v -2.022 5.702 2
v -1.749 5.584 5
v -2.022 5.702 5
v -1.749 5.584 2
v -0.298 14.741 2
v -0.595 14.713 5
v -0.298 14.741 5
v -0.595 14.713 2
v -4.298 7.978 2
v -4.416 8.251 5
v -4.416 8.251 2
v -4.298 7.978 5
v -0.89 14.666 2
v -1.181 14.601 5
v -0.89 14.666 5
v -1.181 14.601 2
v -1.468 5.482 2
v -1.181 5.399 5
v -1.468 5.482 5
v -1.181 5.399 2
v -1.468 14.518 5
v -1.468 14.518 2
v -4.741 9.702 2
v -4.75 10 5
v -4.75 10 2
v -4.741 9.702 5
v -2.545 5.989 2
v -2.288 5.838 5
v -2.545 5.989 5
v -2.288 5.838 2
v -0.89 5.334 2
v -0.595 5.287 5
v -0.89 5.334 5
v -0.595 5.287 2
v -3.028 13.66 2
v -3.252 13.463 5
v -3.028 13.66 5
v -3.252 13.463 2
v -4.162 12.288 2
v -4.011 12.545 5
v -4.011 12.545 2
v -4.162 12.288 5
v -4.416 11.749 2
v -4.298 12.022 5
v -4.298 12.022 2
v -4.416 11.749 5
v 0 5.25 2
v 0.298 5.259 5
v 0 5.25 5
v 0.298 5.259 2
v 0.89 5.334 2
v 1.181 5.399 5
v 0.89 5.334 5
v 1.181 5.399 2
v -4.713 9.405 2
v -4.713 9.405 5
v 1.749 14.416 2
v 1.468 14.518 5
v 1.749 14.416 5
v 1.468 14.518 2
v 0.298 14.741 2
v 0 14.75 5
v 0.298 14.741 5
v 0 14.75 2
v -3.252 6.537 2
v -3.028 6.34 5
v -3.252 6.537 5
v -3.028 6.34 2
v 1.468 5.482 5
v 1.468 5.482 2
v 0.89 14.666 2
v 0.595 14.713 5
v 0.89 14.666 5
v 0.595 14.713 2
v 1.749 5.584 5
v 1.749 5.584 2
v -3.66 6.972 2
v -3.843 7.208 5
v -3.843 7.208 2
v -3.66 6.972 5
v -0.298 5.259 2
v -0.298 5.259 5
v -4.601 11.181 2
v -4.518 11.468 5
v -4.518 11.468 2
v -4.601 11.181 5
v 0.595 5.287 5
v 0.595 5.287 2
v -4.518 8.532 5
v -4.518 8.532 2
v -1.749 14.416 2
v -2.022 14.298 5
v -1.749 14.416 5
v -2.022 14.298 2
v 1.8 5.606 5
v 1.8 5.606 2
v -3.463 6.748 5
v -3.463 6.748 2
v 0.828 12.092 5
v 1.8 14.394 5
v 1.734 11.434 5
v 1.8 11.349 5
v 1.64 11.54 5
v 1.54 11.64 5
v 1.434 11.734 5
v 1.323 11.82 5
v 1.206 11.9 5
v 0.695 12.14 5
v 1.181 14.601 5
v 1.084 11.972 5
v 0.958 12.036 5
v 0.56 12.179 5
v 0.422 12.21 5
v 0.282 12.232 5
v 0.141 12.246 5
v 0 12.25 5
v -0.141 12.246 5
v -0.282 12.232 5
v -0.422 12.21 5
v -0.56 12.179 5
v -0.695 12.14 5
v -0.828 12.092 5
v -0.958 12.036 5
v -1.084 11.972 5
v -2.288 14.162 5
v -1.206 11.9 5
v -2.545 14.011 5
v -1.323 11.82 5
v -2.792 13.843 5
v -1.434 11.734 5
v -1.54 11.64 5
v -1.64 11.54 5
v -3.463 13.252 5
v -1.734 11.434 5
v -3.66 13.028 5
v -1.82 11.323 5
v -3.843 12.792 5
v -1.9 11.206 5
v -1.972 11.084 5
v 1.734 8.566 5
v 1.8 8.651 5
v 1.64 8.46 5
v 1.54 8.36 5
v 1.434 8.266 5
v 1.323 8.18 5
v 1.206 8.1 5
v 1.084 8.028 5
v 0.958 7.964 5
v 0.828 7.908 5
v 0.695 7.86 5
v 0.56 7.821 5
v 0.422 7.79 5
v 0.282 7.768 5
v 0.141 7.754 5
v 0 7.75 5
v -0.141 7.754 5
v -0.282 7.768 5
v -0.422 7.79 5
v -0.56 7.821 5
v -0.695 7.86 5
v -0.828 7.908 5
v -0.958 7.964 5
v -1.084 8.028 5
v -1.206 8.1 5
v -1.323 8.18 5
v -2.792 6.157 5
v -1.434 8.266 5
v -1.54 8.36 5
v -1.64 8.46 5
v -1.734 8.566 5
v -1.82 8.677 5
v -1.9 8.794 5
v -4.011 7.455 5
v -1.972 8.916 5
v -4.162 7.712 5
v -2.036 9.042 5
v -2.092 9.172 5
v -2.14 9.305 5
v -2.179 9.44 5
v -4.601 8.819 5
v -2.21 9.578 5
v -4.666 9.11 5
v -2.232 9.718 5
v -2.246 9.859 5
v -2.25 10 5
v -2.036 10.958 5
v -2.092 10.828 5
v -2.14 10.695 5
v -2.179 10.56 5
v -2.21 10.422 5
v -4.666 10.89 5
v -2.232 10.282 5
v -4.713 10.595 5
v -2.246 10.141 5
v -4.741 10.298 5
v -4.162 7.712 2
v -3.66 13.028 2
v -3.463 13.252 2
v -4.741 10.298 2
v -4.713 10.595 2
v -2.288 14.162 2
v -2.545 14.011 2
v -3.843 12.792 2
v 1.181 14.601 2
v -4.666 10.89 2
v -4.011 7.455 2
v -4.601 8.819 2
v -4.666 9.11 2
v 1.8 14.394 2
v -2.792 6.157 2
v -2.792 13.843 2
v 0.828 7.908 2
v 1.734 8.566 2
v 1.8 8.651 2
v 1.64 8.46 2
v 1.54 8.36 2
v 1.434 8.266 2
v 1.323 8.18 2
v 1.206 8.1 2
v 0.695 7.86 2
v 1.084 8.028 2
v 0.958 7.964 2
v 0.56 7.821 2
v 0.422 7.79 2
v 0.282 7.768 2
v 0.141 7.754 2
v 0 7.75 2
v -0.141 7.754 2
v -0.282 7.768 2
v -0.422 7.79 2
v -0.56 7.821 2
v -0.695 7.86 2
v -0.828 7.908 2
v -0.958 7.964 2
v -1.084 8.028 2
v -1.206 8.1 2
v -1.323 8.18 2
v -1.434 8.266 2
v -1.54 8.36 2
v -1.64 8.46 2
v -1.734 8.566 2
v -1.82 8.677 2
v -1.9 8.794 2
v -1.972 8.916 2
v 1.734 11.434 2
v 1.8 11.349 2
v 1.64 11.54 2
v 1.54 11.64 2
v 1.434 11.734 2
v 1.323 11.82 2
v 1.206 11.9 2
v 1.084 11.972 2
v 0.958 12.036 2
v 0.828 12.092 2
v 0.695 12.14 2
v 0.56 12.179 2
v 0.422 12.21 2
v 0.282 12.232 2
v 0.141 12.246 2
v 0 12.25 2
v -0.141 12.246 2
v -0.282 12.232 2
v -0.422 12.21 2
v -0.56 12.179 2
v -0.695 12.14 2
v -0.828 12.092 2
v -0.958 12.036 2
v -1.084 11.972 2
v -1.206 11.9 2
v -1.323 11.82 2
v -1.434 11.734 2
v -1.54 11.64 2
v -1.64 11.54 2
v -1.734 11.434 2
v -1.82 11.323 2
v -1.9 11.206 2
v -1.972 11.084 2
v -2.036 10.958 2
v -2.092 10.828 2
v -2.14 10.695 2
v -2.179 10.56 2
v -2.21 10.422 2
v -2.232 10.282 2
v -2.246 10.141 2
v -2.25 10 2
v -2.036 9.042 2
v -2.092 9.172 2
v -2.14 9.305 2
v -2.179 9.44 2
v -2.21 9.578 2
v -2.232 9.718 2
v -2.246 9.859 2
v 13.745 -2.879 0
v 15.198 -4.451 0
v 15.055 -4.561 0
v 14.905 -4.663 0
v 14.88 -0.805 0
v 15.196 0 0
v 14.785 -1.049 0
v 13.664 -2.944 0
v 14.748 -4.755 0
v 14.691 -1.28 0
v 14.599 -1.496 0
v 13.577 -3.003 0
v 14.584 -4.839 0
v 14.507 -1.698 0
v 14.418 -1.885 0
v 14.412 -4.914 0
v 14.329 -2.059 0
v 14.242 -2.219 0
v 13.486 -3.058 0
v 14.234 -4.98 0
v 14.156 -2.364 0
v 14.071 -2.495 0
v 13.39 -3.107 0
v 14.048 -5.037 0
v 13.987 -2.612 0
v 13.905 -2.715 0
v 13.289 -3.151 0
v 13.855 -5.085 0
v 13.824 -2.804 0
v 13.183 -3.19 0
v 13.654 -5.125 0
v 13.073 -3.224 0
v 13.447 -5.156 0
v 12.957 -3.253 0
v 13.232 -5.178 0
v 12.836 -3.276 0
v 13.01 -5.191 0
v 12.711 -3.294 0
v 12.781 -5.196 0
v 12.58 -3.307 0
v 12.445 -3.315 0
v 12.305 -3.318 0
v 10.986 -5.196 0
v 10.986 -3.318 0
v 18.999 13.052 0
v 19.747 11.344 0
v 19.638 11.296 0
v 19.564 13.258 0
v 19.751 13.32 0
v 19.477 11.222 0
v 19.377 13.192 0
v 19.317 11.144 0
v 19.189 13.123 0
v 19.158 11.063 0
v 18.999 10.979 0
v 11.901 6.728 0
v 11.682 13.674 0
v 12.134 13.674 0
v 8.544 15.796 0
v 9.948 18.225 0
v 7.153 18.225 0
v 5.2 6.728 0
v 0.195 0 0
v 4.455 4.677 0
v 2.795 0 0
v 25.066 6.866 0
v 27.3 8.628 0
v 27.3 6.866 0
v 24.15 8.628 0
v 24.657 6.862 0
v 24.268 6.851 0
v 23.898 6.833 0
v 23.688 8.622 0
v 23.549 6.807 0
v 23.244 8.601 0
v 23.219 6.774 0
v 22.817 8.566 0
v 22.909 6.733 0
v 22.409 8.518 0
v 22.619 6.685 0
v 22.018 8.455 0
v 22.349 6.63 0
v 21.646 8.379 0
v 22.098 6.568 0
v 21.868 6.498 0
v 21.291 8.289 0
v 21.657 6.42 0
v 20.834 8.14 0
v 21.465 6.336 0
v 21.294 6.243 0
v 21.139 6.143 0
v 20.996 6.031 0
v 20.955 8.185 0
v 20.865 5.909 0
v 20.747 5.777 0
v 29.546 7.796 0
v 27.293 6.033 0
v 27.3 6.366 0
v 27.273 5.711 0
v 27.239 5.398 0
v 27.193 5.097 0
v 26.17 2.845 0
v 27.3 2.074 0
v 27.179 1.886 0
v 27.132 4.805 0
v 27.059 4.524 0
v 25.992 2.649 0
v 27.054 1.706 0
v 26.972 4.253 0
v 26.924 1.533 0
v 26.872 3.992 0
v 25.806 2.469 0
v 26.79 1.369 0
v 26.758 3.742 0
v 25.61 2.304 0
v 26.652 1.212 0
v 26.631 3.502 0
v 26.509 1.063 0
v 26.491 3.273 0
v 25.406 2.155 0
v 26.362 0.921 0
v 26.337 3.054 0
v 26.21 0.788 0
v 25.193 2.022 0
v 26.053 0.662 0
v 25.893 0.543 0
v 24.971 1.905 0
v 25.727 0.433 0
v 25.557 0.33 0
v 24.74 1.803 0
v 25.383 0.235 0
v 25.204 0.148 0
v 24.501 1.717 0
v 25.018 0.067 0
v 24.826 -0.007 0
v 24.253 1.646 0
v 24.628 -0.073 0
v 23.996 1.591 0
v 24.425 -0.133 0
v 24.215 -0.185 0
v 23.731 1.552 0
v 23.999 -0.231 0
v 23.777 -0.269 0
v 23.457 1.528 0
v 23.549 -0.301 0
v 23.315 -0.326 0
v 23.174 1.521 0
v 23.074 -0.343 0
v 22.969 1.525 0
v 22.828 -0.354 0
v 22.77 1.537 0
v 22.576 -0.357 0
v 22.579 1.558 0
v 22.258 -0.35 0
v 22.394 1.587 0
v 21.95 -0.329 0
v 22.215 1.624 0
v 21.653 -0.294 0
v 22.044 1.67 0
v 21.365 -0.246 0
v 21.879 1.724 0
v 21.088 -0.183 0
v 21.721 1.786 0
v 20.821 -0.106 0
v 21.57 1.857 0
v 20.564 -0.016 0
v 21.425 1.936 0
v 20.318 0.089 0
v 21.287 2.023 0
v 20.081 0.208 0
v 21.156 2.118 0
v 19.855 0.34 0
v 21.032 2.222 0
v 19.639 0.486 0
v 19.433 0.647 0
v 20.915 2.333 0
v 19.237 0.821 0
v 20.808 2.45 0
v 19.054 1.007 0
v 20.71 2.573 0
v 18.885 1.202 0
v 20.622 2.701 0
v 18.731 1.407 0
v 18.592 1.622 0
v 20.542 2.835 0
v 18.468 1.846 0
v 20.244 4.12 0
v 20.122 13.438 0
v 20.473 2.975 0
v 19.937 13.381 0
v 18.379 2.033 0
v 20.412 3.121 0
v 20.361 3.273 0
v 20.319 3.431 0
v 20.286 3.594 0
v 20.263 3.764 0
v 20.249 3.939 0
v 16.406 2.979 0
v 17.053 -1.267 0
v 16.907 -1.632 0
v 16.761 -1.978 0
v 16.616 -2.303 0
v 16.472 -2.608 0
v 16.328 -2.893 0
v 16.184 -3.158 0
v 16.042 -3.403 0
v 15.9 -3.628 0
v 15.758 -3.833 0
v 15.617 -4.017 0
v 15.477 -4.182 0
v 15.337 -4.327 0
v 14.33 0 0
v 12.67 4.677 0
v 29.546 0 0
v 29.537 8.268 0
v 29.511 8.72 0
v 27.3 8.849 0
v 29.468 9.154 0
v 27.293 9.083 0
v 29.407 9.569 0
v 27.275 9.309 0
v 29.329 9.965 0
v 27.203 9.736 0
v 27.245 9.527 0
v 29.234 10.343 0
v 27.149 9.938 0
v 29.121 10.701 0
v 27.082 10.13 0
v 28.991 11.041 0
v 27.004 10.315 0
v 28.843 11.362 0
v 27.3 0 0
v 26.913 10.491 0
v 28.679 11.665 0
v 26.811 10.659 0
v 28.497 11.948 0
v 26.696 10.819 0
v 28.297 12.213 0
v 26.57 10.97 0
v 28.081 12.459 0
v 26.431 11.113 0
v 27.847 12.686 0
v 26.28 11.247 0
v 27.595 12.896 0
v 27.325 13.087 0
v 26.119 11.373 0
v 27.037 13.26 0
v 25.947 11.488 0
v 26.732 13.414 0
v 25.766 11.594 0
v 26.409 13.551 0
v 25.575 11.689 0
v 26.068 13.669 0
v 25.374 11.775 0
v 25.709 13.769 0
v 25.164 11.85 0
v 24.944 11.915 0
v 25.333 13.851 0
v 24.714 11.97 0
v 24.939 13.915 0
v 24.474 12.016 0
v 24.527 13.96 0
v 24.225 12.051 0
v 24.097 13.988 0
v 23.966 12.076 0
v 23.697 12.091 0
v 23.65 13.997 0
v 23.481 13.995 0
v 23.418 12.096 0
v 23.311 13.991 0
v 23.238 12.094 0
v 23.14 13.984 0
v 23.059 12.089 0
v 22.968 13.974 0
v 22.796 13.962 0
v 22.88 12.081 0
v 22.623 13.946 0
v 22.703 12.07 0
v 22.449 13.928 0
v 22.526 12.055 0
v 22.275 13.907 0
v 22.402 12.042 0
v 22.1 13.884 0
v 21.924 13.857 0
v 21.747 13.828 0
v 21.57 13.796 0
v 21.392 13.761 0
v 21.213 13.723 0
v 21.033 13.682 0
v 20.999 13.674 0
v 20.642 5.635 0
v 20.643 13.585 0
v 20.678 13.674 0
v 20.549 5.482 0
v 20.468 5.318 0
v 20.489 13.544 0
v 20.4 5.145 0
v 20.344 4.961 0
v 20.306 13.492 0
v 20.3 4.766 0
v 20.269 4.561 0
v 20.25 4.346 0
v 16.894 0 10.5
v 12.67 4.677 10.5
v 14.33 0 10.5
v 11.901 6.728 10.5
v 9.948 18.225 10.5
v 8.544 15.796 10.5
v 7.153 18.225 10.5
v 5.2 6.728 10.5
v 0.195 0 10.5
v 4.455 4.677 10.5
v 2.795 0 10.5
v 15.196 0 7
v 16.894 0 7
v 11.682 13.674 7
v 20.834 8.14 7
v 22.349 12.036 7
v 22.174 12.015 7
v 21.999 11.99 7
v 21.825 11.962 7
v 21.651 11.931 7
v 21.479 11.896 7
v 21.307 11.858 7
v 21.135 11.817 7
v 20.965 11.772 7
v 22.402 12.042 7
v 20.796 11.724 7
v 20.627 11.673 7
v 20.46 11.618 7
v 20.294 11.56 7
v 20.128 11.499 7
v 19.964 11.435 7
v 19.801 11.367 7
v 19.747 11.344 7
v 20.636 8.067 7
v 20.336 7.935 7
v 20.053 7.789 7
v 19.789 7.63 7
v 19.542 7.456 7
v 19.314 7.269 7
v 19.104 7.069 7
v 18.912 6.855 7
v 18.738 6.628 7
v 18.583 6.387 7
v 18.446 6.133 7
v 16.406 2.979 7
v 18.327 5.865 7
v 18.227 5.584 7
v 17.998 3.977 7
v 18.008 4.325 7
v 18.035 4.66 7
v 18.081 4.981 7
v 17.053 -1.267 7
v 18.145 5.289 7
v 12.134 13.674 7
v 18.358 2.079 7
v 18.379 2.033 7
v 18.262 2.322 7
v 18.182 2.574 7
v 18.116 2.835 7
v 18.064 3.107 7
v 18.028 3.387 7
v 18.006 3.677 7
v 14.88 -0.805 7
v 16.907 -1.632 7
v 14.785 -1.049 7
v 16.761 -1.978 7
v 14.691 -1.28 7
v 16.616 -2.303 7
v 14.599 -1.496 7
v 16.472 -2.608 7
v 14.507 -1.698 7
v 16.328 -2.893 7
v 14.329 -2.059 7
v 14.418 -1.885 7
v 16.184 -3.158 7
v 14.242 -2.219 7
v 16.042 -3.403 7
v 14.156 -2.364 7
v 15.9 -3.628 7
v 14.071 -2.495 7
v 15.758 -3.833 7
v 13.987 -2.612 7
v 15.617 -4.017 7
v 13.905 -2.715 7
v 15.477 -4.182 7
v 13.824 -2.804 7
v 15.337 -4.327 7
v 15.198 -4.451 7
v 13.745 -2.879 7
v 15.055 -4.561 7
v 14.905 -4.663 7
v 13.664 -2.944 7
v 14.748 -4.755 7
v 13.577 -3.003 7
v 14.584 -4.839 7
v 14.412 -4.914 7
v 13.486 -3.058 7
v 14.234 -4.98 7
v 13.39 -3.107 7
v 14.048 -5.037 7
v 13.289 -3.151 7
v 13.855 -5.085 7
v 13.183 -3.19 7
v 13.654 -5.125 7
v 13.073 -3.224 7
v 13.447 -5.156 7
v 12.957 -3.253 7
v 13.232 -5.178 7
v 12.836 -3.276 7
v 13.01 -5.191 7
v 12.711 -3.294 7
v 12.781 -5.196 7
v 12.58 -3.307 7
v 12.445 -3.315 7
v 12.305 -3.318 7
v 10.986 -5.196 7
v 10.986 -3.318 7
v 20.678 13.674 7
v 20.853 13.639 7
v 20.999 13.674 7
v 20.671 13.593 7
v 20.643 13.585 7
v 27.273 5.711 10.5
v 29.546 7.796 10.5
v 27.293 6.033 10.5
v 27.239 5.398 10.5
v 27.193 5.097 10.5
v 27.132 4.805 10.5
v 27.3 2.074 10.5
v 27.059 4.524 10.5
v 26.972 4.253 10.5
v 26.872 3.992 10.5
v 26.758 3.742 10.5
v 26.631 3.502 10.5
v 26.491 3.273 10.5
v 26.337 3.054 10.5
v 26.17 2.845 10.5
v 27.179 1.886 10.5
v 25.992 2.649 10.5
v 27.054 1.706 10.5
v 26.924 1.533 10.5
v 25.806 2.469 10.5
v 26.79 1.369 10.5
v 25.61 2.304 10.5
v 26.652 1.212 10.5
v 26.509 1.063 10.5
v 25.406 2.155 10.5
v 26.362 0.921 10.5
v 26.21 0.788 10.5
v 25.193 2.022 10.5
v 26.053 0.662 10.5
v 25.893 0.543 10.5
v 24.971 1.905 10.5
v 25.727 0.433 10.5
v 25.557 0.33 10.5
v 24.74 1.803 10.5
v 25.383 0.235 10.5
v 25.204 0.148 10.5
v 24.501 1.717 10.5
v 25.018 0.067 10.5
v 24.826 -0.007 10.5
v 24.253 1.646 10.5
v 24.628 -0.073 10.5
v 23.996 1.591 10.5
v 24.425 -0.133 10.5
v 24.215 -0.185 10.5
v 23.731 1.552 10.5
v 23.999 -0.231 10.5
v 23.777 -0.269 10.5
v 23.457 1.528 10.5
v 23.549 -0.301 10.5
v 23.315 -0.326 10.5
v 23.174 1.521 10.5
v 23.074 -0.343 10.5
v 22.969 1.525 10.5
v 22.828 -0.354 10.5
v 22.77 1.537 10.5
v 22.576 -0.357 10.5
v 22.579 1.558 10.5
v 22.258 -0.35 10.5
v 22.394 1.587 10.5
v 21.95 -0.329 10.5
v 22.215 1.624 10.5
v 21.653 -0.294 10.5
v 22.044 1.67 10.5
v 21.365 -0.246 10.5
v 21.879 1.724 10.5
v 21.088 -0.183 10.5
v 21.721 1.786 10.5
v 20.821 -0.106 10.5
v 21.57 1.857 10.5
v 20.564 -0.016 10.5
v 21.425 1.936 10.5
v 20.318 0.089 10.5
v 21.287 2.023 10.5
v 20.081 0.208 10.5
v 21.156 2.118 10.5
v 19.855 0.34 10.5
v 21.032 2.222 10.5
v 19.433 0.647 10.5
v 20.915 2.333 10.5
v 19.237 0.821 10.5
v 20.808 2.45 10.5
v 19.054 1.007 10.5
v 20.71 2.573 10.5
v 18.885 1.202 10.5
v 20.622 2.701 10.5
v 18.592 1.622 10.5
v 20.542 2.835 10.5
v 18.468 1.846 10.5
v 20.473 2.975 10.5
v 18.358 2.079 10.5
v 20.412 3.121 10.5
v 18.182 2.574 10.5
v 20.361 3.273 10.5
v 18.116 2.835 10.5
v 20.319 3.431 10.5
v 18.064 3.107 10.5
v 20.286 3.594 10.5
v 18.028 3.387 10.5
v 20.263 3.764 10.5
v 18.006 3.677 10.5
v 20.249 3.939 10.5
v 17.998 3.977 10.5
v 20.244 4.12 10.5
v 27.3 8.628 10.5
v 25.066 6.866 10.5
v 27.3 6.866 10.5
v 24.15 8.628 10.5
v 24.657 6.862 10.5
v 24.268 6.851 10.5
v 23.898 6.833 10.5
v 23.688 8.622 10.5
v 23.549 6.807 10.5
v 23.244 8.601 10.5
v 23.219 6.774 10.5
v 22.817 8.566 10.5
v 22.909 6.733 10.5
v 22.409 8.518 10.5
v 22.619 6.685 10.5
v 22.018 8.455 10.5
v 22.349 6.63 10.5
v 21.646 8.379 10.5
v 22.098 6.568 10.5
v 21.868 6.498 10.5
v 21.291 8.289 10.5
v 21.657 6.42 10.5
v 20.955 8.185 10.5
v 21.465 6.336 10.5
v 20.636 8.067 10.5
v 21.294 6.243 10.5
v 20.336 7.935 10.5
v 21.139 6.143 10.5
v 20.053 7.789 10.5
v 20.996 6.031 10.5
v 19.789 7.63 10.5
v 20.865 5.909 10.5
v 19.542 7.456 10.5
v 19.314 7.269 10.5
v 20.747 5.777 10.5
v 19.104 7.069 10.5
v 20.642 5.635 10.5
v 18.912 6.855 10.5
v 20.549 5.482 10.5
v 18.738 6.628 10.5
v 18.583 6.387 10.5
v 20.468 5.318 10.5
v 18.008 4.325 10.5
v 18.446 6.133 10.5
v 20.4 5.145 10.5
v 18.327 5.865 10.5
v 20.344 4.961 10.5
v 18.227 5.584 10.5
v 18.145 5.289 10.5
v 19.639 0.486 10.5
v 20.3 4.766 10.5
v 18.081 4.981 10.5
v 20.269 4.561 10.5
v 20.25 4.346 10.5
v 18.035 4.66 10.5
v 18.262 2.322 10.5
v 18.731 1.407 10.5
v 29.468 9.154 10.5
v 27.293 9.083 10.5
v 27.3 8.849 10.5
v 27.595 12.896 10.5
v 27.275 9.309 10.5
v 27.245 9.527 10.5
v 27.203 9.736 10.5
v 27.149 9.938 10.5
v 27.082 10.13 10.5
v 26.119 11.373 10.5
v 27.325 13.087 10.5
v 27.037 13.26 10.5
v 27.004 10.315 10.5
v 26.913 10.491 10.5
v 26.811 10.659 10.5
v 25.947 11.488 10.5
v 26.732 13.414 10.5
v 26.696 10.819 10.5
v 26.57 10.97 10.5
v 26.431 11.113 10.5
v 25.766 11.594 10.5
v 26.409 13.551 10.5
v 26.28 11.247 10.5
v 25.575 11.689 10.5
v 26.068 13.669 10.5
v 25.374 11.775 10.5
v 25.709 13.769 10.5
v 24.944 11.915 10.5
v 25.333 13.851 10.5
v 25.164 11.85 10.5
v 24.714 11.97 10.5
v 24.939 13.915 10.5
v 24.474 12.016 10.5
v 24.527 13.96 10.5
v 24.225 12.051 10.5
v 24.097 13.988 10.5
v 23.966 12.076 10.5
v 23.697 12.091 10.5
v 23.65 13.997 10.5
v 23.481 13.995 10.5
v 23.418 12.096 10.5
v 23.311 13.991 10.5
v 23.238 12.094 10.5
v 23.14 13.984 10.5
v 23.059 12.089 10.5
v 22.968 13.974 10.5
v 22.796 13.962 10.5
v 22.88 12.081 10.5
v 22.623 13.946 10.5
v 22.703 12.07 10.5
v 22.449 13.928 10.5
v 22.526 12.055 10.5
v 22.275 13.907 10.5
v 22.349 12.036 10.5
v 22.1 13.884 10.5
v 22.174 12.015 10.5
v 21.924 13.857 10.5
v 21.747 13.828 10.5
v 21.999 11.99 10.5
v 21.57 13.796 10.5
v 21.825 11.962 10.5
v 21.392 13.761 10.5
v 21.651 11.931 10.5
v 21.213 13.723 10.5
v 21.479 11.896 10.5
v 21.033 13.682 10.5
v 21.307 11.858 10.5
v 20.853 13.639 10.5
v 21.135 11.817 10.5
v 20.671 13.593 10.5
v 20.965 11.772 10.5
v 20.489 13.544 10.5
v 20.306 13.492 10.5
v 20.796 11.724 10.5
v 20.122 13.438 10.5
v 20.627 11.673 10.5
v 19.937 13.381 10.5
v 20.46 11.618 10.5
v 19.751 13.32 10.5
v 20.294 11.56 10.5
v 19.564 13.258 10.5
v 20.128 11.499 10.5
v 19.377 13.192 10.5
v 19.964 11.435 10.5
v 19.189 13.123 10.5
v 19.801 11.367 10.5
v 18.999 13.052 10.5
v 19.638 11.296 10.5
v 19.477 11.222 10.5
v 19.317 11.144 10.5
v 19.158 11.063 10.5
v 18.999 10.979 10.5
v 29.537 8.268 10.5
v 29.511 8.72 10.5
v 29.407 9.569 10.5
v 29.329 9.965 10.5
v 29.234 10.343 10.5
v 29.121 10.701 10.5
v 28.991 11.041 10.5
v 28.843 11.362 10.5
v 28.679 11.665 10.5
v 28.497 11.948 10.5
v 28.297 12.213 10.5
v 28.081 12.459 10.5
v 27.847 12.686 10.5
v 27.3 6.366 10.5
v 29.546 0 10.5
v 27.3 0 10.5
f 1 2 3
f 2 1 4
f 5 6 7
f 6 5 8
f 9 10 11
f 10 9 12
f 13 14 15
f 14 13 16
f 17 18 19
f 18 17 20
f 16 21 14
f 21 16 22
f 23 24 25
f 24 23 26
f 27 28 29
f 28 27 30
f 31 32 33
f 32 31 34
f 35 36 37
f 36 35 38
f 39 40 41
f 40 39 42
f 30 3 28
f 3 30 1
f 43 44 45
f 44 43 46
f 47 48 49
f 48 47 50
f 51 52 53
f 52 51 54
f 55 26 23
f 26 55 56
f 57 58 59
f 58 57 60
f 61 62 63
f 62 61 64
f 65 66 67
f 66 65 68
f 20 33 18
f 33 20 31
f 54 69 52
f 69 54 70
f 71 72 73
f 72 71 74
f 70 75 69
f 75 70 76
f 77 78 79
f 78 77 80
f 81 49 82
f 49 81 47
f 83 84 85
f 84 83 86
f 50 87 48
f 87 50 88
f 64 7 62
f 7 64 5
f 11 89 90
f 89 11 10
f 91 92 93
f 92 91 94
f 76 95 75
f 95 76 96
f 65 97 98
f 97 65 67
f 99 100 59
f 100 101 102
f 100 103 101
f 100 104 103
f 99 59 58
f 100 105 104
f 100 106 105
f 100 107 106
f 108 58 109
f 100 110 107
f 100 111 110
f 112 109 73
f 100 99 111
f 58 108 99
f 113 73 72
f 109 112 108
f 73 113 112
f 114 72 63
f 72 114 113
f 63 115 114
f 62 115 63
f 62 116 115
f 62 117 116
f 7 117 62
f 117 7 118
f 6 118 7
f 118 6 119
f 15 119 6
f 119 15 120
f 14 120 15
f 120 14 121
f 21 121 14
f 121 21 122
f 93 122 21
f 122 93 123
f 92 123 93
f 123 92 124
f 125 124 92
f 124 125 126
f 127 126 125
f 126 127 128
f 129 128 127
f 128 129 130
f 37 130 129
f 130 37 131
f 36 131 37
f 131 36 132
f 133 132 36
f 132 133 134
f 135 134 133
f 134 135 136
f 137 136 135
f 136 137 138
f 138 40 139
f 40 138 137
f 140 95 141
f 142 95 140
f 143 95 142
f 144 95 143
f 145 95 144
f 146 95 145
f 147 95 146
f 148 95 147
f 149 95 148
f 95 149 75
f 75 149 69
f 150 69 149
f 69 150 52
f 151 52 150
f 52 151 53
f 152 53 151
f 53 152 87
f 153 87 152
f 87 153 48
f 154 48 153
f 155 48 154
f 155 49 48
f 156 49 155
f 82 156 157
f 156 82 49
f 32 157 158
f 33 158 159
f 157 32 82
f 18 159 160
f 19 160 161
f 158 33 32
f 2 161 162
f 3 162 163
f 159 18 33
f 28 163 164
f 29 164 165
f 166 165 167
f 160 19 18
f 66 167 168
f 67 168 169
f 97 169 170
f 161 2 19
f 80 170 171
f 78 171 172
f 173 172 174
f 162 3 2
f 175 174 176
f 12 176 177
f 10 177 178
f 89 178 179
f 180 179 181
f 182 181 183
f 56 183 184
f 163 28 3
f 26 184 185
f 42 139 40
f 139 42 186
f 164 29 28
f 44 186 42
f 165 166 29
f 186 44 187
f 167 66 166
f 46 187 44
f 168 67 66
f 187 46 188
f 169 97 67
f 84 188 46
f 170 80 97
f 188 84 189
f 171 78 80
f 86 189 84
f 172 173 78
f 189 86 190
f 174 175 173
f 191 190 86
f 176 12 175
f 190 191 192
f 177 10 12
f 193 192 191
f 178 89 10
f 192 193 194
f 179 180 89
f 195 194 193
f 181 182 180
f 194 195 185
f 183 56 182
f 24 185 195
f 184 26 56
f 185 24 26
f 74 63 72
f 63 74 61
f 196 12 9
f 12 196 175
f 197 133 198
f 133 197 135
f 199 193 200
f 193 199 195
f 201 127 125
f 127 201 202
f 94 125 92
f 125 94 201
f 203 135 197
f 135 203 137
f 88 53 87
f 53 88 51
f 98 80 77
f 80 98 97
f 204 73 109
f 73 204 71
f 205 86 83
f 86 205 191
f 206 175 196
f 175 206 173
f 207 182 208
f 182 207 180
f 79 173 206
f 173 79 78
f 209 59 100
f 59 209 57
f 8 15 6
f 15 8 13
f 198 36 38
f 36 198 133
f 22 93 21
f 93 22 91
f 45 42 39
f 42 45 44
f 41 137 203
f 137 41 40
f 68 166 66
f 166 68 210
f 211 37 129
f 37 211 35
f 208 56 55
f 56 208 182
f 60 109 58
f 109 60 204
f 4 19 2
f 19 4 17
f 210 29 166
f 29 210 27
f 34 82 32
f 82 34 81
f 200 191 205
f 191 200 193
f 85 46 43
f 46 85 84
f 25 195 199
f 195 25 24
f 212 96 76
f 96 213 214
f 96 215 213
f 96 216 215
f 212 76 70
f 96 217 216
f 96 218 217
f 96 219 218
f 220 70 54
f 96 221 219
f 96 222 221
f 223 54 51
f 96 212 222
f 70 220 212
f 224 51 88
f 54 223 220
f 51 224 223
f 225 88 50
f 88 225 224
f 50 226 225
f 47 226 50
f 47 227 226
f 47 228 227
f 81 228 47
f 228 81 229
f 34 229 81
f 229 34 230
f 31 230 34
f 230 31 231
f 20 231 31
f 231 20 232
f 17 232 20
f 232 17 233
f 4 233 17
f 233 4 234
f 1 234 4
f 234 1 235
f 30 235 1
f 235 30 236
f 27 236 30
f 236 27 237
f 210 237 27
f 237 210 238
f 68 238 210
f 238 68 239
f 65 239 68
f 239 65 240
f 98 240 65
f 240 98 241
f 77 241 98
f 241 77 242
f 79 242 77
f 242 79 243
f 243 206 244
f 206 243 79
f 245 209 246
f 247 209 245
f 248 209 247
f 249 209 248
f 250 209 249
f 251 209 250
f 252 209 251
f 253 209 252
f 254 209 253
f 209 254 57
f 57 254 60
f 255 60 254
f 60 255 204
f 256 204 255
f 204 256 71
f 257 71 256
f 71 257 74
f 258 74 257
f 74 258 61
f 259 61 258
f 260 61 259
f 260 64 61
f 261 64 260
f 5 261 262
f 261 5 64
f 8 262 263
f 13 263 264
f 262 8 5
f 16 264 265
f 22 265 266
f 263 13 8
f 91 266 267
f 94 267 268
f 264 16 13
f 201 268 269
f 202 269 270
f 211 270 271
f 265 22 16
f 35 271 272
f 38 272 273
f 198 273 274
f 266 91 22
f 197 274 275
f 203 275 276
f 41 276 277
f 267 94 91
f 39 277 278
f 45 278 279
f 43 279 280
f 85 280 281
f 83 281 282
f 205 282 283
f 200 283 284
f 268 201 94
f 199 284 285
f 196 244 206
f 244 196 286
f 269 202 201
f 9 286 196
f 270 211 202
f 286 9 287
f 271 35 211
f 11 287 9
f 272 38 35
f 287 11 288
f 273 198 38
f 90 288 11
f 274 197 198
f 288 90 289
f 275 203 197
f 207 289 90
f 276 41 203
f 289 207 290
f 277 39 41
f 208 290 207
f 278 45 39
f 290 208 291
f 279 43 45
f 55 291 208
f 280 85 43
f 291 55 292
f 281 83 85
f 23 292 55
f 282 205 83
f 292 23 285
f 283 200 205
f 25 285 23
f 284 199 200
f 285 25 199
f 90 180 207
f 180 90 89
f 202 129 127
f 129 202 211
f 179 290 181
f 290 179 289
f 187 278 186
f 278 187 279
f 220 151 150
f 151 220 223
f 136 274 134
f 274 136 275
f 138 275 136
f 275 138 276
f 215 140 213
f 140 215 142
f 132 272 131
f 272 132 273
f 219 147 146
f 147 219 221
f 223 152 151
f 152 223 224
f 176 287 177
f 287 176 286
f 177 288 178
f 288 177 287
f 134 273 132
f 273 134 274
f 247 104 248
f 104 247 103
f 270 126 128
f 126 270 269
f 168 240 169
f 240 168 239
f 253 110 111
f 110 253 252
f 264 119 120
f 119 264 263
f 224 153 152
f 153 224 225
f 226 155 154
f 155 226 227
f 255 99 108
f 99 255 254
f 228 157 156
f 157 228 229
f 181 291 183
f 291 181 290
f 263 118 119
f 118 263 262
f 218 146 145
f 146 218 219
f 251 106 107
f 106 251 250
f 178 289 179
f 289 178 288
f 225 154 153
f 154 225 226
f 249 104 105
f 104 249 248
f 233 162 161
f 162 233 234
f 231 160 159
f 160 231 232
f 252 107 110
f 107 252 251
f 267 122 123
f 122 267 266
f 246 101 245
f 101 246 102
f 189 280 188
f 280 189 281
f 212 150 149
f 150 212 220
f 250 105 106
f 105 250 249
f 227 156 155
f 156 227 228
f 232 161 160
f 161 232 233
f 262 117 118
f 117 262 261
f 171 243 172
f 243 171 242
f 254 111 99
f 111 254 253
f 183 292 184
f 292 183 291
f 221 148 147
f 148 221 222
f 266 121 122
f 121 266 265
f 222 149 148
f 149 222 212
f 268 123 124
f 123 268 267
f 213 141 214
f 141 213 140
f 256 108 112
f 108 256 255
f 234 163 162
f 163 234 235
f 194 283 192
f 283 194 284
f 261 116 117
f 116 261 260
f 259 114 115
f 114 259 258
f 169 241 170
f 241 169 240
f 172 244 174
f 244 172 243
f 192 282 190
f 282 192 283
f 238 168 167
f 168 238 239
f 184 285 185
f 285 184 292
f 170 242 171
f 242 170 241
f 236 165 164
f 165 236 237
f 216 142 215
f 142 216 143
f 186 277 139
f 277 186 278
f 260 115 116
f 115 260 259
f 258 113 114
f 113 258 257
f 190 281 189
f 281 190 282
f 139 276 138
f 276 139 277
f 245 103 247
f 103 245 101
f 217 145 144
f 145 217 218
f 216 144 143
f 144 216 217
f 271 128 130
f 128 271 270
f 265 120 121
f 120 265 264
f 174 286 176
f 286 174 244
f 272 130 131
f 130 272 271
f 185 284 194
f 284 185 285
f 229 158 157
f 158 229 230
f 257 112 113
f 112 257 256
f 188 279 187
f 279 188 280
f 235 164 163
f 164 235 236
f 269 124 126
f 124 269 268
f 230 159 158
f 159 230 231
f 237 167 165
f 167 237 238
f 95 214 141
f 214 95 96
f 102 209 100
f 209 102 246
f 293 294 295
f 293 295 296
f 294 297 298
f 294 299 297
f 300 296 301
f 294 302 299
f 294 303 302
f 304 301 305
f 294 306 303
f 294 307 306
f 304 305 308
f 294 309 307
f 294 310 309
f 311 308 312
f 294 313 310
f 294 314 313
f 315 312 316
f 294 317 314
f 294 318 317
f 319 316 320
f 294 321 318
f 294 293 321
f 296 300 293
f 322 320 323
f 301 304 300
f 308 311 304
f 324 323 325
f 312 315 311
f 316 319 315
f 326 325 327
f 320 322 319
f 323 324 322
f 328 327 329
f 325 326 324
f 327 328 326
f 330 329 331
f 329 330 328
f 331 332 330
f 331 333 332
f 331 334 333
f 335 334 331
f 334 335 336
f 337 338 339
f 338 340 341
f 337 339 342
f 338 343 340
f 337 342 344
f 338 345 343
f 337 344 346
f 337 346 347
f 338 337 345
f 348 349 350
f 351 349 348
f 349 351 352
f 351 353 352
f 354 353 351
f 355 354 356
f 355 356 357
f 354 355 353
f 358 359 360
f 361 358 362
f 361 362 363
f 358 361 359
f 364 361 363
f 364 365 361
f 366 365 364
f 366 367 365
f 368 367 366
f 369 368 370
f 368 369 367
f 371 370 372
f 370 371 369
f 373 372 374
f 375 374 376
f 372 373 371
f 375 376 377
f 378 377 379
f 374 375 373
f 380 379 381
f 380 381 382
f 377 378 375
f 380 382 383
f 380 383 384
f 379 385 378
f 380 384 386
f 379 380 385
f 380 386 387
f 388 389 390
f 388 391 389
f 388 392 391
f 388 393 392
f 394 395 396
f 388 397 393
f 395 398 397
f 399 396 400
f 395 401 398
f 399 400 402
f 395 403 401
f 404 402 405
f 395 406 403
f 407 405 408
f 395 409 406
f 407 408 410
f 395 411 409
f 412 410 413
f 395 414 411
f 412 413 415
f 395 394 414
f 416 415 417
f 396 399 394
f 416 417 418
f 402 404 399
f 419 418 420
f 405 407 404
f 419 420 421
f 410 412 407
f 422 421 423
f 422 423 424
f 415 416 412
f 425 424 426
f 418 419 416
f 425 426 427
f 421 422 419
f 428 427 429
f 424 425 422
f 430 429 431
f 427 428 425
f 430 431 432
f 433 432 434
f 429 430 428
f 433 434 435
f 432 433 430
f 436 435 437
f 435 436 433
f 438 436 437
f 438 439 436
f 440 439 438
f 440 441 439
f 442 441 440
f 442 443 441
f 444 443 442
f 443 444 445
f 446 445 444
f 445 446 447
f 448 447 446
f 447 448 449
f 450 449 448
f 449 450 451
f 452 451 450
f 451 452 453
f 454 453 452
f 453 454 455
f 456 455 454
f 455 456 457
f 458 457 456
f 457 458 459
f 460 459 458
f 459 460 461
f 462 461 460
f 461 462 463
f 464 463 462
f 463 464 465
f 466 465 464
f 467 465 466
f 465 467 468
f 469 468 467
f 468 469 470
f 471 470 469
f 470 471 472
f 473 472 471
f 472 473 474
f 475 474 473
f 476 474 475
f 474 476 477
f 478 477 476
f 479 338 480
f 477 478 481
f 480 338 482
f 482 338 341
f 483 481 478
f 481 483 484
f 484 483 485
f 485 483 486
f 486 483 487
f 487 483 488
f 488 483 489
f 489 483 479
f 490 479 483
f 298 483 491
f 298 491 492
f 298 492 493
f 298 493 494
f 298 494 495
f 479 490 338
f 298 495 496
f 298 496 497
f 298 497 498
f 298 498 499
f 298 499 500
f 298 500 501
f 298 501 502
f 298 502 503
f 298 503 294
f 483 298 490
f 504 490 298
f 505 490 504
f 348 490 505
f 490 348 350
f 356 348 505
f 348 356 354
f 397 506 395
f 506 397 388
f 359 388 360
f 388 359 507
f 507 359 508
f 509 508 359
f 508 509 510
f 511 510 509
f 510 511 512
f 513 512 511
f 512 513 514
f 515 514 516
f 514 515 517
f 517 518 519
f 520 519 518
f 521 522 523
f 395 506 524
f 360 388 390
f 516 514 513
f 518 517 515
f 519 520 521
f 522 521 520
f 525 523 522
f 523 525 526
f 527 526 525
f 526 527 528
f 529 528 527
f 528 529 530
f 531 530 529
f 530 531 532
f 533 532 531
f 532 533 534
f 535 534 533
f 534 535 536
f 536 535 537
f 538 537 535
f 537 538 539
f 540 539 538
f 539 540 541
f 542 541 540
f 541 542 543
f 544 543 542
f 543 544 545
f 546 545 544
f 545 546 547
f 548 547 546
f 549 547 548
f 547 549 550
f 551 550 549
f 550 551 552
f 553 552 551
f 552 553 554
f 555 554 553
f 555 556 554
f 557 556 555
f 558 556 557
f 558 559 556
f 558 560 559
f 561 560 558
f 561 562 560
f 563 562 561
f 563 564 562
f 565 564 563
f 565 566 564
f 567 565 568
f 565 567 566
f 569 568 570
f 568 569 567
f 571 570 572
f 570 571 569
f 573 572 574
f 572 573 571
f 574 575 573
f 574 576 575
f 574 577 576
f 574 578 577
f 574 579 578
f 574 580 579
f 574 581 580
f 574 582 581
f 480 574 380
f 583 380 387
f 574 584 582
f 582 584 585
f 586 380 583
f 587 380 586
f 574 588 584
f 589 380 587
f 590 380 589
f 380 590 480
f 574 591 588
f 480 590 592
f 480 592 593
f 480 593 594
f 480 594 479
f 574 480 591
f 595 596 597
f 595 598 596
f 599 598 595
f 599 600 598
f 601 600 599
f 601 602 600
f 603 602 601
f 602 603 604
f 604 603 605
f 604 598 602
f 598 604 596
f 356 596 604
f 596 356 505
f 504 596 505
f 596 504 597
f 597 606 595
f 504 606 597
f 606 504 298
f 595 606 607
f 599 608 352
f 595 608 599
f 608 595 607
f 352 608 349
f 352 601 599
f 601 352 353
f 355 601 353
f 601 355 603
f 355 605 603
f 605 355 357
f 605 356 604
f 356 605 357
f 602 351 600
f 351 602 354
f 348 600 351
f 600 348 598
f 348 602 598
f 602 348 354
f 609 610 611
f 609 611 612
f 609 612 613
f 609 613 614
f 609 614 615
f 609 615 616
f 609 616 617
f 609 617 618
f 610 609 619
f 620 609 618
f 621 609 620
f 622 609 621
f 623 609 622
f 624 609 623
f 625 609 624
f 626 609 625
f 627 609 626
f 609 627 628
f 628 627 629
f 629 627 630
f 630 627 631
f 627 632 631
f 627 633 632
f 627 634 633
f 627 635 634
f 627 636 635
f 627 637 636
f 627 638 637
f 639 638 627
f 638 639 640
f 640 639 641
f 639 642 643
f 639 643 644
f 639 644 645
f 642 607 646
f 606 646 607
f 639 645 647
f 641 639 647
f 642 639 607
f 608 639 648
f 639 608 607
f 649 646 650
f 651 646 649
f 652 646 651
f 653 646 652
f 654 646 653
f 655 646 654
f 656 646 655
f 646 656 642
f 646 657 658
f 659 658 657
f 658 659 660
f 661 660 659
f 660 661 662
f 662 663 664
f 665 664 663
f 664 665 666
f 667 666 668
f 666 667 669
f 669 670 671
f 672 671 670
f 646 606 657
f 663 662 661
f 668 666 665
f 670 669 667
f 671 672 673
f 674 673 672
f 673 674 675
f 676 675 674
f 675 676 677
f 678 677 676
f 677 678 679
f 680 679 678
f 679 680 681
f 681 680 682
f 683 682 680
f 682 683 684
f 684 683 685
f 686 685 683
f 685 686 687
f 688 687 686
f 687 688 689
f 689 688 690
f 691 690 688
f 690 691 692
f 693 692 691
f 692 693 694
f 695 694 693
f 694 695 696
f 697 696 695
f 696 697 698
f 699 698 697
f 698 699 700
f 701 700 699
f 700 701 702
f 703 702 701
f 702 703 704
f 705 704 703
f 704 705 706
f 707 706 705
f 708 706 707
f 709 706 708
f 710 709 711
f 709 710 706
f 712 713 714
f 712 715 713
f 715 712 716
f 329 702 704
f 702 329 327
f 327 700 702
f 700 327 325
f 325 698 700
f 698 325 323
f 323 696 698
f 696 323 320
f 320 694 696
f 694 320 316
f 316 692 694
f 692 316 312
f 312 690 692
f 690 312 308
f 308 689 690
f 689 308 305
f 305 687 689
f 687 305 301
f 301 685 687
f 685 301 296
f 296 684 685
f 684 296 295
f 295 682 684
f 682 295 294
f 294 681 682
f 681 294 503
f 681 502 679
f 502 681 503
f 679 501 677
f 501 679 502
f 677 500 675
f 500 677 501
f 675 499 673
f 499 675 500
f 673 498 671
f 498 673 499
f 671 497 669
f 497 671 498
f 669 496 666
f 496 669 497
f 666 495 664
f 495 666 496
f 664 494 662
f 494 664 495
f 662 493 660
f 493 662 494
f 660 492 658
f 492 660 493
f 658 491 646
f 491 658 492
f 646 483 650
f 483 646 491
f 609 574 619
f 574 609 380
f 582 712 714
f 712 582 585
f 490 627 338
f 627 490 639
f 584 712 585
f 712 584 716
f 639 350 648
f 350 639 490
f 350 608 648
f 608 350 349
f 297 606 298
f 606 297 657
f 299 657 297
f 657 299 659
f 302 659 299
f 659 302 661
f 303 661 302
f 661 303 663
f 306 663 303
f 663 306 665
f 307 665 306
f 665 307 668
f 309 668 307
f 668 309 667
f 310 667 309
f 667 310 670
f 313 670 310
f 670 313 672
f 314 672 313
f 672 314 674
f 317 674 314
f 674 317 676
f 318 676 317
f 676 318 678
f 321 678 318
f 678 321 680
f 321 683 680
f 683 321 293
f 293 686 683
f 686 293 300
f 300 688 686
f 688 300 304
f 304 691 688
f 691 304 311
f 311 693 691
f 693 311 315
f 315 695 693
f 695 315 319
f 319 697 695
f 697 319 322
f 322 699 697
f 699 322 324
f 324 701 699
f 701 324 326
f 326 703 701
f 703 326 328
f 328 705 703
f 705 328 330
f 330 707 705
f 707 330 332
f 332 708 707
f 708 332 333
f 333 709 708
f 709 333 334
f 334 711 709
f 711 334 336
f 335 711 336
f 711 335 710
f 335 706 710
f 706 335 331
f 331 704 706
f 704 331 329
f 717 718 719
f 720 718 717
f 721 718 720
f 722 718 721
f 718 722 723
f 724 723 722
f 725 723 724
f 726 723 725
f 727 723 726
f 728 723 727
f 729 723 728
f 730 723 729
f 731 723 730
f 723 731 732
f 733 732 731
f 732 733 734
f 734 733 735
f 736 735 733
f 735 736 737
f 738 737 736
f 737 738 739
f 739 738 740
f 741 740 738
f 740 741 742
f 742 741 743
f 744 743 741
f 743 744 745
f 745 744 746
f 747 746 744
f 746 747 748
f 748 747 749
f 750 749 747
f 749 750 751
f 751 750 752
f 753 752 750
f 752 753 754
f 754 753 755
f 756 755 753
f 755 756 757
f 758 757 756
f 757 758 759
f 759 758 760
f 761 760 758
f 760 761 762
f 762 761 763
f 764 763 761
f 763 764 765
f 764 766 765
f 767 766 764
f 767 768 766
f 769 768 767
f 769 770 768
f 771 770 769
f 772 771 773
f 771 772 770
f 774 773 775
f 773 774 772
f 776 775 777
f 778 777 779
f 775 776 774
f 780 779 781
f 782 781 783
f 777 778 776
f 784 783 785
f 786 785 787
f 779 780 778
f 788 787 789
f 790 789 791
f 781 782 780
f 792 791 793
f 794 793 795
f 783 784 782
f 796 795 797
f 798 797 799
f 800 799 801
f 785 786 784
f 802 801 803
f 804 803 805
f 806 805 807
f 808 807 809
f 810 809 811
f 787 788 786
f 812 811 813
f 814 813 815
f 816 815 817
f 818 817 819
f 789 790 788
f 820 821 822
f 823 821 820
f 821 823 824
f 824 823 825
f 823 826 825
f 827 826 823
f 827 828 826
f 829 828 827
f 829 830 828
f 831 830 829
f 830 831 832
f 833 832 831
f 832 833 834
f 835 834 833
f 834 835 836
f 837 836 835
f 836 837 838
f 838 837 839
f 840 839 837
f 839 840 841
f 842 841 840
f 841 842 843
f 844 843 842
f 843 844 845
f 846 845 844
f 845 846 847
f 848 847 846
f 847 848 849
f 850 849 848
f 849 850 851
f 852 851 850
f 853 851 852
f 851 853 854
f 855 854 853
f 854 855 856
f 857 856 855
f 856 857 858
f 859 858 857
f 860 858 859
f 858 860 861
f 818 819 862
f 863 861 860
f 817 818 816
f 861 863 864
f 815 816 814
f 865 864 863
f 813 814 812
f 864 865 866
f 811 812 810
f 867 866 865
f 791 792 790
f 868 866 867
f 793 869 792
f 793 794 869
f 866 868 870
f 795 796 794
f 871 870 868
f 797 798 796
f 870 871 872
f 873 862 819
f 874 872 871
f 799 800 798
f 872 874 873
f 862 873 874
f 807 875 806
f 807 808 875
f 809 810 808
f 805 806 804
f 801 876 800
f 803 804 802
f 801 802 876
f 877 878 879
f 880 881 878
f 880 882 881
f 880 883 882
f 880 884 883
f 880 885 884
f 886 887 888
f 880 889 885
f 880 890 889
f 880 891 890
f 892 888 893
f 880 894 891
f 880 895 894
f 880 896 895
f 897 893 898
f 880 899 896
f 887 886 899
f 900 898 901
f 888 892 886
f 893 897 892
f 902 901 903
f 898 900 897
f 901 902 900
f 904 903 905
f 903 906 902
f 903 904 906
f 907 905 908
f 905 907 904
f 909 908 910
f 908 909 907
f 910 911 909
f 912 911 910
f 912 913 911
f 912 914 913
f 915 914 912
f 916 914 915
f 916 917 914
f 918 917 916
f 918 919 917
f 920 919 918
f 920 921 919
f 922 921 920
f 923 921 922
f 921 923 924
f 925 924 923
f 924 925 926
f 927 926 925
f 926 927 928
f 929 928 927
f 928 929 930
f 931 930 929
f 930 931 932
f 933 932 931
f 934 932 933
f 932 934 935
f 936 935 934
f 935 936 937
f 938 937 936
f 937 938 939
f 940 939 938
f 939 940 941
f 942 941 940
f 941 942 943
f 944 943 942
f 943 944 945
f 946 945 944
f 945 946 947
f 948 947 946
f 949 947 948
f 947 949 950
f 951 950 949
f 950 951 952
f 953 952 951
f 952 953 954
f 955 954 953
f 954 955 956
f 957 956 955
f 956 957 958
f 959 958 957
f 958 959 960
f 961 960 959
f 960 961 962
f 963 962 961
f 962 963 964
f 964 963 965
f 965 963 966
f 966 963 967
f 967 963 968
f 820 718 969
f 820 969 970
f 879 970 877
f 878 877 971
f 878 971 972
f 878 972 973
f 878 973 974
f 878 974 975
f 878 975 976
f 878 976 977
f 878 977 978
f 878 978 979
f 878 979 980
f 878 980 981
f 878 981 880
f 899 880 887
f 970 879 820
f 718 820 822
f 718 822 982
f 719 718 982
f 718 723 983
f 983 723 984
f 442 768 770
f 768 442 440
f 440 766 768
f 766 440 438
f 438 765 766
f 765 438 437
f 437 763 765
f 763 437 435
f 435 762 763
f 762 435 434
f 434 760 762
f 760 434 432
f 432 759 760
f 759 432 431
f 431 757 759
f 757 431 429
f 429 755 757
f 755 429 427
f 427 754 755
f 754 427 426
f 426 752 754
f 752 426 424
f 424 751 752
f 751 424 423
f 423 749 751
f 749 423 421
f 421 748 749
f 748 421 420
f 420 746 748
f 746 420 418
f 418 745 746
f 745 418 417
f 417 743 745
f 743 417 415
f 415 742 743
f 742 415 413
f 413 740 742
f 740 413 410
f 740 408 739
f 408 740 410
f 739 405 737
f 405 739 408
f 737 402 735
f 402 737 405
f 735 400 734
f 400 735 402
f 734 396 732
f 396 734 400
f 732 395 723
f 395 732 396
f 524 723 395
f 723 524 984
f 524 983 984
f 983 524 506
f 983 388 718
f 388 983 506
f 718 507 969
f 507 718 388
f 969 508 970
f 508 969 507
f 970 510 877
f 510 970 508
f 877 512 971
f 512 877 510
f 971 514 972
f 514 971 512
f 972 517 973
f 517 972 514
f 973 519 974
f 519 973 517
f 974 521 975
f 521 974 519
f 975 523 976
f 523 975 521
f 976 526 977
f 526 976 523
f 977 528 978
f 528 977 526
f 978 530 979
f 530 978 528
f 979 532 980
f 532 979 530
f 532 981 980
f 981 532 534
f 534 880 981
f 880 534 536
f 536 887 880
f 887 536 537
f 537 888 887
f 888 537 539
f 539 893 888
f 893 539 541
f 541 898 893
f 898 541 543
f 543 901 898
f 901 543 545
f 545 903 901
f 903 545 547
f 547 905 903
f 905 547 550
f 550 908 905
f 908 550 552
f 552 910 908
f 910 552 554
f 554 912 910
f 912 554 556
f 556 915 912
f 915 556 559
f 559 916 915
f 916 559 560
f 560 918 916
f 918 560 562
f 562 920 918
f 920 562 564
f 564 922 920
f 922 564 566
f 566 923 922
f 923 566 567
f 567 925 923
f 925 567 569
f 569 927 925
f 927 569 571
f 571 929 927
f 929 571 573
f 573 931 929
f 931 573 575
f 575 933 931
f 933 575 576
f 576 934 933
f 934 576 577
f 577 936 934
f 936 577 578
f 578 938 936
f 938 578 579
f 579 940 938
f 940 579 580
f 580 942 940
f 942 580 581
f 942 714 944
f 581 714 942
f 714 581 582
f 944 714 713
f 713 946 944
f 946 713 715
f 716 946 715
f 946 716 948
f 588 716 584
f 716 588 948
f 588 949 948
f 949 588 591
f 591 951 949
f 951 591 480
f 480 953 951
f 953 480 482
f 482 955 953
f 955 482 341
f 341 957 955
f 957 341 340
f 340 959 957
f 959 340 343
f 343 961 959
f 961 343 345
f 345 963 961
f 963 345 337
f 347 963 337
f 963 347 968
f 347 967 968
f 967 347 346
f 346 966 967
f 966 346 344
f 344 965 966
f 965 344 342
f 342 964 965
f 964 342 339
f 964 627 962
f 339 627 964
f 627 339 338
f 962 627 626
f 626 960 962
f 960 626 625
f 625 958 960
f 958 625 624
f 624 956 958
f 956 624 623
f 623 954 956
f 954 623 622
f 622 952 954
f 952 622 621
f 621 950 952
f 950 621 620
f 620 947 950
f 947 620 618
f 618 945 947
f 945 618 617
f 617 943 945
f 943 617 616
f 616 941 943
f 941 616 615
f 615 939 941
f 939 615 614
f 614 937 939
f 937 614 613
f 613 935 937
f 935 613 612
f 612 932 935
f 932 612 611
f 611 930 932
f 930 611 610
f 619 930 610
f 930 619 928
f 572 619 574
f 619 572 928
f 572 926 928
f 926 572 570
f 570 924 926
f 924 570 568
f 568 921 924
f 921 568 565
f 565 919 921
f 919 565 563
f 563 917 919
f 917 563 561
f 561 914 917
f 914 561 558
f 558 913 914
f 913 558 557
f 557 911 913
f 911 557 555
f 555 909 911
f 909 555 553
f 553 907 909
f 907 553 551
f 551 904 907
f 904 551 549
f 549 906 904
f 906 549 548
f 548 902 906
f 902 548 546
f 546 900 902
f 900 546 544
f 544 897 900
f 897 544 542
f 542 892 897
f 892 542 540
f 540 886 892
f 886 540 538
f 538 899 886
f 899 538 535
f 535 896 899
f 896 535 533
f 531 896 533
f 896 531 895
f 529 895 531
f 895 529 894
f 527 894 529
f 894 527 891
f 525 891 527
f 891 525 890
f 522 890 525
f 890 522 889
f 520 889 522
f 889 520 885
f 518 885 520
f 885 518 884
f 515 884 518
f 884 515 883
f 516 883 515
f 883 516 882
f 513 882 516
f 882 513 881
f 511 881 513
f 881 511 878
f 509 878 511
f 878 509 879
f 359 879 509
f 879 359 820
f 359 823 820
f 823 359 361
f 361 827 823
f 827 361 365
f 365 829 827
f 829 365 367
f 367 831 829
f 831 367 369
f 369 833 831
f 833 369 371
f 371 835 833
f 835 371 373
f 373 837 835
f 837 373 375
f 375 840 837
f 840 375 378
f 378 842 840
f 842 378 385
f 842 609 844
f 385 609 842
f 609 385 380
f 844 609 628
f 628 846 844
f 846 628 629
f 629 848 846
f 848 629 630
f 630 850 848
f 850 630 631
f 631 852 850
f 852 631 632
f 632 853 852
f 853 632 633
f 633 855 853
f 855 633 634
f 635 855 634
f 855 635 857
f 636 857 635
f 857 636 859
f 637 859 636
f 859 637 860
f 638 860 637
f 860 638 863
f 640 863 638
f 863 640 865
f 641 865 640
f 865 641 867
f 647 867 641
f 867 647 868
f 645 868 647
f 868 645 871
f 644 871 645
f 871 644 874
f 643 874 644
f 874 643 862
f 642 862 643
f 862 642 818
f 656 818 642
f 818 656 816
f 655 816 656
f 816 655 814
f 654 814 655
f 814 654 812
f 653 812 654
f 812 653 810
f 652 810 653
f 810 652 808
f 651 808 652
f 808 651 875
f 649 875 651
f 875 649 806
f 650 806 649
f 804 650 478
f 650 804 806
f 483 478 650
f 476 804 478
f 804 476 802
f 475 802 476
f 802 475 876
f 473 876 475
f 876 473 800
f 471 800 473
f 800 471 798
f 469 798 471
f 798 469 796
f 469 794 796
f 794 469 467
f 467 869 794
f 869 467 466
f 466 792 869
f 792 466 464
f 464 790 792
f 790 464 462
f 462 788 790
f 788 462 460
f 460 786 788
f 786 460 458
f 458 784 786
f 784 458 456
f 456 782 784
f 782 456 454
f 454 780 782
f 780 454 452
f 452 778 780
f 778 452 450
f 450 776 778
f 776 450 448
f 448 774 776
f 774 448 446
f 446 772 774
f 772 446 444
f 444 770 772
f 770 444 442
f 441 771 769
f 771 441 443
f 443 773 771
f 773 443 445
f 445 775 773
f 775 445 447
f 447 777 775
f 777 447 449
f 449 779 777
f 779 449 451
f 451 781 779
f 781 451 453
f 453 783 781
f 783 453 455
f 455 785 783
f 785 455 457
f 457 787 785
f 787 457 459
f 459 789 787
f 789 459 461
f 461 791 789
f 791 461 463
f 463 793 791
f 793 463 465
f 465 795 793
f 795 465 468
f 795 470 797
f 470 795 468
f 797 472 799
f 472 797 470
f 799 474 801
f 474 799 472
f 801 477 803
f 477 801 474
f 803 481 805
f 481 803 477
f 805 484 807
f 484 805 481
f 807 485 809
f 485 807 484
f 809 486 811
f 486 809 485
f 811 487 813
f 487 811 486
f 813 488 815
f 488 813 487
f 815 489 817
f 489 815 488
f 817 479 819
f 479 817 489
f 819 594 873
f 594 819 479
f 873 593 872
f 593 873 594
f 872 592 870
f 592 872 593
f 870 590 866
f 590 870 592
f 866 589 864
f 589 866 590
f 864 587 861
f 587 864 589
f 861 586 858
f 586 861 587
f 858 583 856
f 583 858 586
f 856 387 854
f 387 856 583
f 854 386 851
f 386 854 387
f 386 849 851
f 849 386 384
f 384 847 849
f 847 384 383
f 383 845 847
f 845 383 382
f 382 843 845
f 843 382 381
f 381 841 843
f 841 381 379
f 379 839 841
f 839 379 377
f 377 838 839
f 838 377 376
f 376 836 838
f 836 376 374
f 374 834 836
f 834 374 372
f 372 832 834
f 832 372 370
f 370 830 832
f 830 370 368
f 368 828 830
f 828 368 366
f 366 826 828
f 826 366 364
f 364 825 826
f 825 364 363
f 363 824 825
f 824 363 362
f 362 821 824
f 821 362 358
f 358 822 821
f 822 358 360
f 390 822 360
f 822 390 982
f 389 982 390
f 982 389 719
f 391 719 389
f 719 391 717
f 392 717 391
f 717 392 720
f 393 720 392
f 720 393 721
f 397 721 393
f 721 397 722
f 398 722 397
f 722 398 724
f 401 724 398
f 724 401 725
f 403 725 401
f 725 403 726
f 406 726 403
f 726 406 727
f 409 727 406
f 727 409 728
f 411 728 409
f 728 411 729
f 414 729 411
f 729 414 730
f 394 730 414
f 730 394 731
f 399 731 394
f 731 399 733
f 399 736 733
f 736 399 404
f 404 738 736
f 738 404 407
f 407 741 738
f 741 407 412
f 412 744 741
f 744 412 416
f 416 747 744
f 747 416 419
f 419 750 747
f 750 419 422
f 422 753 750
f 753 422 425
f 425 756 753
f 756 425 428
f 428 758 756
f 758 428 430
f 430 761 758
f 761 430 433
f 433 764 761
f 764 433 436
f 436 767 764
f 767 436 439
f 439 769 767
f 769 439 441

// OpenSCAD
/* [Text] */
// Text
text = "Aya";

/* [General Settings] */
// Font
font = "Anton"; // [Archivo Black, Bangers, Bungee, Changa One, Bebas Neue, Poppins Black]

// Font size
font_size = 18; // [5:1:50]

// Global spacing multiplier
spacing = 0.65; // [0.1:0.05:2]

// Use automatic spacing based on character width
use_auto_spacing = true; // [true,false]

/* [Colors] */
// Use single color
use_single_color = true; // [true,false]


keychainHoleSize = 4.5; // Diameter of the keychain hole
keychainHoleOffset = -2;// Offset of the keychain hole from the left
// Radius of edge, Increase to fill in gaps
r = 2;

// Box customization parameters
boxWidth = 0;      // Width of the box
boxHeight = 0;     // Height of the box
boxXOffset = 0;     // Horizontal offset for the box
boxYOffset = -30;   // Vertical offset for the box
// Color array definition
$fn = 100;
thickness = 4;
available_colors = [
    ["Red", [1, 0, 0]],
    ["Dark Red", [0.5, 0, 0]],
    ["Green", [0, 1, 0]],
    ["Dark Green", [0, 0.5, 0]],
    ["Blue", [0, 0, 1]],
    ["Dark Blue", [0, 0, 0.5]],
    ["Yellow", [1, 1, 0]],
    ["Orange", [1, 0.5, 0]],
    ["Purple", [0.5, 0, 0.5]],
    ["Pink", [1, 0.4, 0.7]],
    ["White", [1, 1, 1]],
    ["Black", [0, 0, 0]],
    ["Light Gray", [0.8, 0.8, 0.8]],
    ["Dark Gray", [0.3, 0.3, 0.3]],
    ["Turquoise", [0, 0.8, 0.8]]
];

// General color
general_color = "Green";

// Ring color
ring_color = "Green";

/* [Individual Adjustments] */
position_1  = 0;
position_2  = 0;
position_3  = 0;
position_4  = 0;
position_5  = 0;
position_6  = 0;
position_7  = 0;
position_8  = 0;
position_9  = 0;
position_10 = 0;
position_11 = 0;
position_12 = 0;

/* [Heights] */
// Height for odd letters
odd_height = 10.5; // [1:0.5:10]

// Height for even letters
even_height = 7; // [1:0.5:10]

/* [Ring] */
show_ring = true;
ring_x = -4.0;
ring_y = 0.5;
ring_height = 3;
ring_size = 8;

/* [Lowercase i Connector] */
enable_i_connector = true; // [true,false]
i_connector_width  = 4.3;  // [0.4:0.1:2]
i_connector_depth  = 2.6;  // [0.4:0.1:2]

/* ========================================================= */
/* ===================== FUNCTIONS ========================= */
/* ========================================================= */

function get_color_rgb(color_name) =
    let(c = [for(x = available_colors) if (x[0] == color_name) x[1]])
    len(c) > 0 ? c[0] : [1,1,1];

function get_height(pos) =
    (pos % 2 == 0) ? odd_height : even_height;

function get_adjustment(pos) =
    pos == 0  ? position_1  :
    pos == 1  ? position_2  :
    pos == 2  ? position_3  :
    pos == 3  ? position_4  :
    pos == 4  ? position_5  :
    pos == 5  ? position_6  :
    pos == 6  ? position_7  :
    pos == 7  ? position_8  :
    pos == 8  ? position_9  :
    pos == 9  ? position_10 :
    pos == 10 ? position_11 :
    pos == 11 ? position_12 : 0;

function get_ring_y_offset(c) =
    in_string(c, 
    "S" ) ? 16 // atas
    : in_string(c,
    "s" ) ? 13 // atas
    : in_string(c,
    "ZJ2a" ) ? 6 // bawah
    : 10; // normal


function get_cumulative_adjustment(pos) =
    pos < 0 ? 0 :
    get_cumulative_adjustment(pos - 1) + get_adjustment(pos);
// Character width heuristic
function in_string(c, s) = len(search(c, s)) > 0;

function get_letter_width(c) =
    in_string(c, 
    "I." ) ? 0.3
    : in_string(c, 
    "ilI!j|[]'," ) ? 0.36
    : in_string(c, 
    "ft") ? 0.45
    : in_string(c, 
    "r1") ? 0.52
    : in_string(c,
    "0123456789TFE") ? 0.6
    : in_string(c,
    "zZLy") ? 0.7
    : in_string(c,
    "vxSJY") ? 0.8
    : in_string(c, 
    "w") ? 1.15
    : in_string(c, 
    "WmM@#") ? 1.35
    : in_string(c, 
    "@") ? 1.5
    : 0.87;

function get_auto_spacing(pos) =
    pos < 0 ? 0 :
    get_auto_spacing(pos - 1)
    + (font_size * spacing * get_letter_width(text[pos]));

function is_lowercase_i(c) = c == "i" || c == "j";

kerning_pairs = [
    ["AV", -0.1],
    ["VA", -0.12],
    ["AW", -0.1],
    ["WA", -0.1],
    ["AT", -0.06],
    ["Fa", -0.06],
    ["aj", -0.06],
    ["TA", -0.05],
    ["AY", -0.1],
    ["Ay", -0.1],
    ["YA", -0.1],
    ["PA", -0.09],
    ["TT", 0.1],
    
    ["wa", 0.1],
    ["ya", -0.06],
    ["tt", 0.1],
    ["wt", 0.1],
    ["wt", 0.1],
    ["wv", 0.06],
    ["yw", -0.06],
    ["yv", -0.06],
    ["aw", -0.06],
    ["ij", -0.05],
    ["Ij", -0.05],
    ["je", -0.1],
    ["ji", -0.15],
    ["aT", -0.05],
    ["Ta", -0.05],
    ["At", -0.05],
    ["tA", -0.05],
    ["at", -0.05],
    ["ta", -0.05],
    ["ox", -0.05],
    ["xo", -0.05],
    ["Tv", -0.05],
    ["vT", -0.05],
    ["rJ", -0.13],
    ["Yx", -0.1],
    ["xY", -0.1],
    ["Yr", -0.1],
    ["YJ", -0.2],
    ["Yy", -0.1],
    ["Tx", -0.05],
    ["xT", -0.05],
    ["Rj", -0.05],
    ["Xy", -0.08],
    ["Yj", -0.08],
    ["vJ", -0.08],
    ["VJ", -0.08],
    ["Vj", -0.08],
    ["vj", -0.08],
    ["WJ", -0.08],
    ["wJ", -0.08],
    ["YC", -0.05],
    ["CY", -0.05],
    ["YG", -0.05],
    ["GY", -0.05],
    ["LY", -0.25],
    ["OY", -0.05],
    ["YO", -0.05],
    ["QY", -0.05],
    ["YQ", -0.05],
    ["PY", -0.05],
    ["aY", -0.1],
    ["Ya", -0.1],
    ["Yb", -0.1],
    ["cY", -0.1],
    ["Yc", -0.1],
    ["dY", -0.1],
    ["eY", -0.1],
    ["Ye", -0.1],
    ["fY", -0.08],
    ["Yg", -0.1],
    ["Ym", -0.1],
    ["nY", -0.1],
    ["Yn", -0.1],
    ["oY", -0.1],
    ["Yo", -0.1],
    ["pY", -0.1],
    ["Yp", -0.1],
    ["qY", -0.1],
    ["Yq", -0.1],
    ["sY", -0.1],
    ["Ys", -0.1],
    ["uY", -0.08],
    ["Yu", -0.08],
    ["vY", -0.08],
    ["Yv", -0.08],
    ["Yw", -0.08],
    ["Yz", -0.08],
    ["ra", -0.03],
    ["re", -0.03],
    ["rs", -0.03],
    ["rq", -0.03],
    ["Le", -0.12],
    ["Lo", -0.12],
    ["Lq", -0.12],
    ["La", -0.12],
    ["Ld", -0.12],
];

// Adjustment untuk satu posisi (non kumulatif)
function get_pair_adjustment_single(pos, i=0) =
    pos <= 0 ? 0 :
    let(pair = str(text[pos-1], text[pos]))
    (
        i >= len(kerning_pairs) ? 0 :
        pair == kerning_pairs[i][0]
            ? font_size * spacing * kerning_pairs[i][1]
            : get_pair_adjustment_single(pos, i+1)
    );

// Kerning kumulatif sampai posisi sekarang
function get_pair_adjustment(pos) =
    pos < 0 ? 0 :
    get_pair_adjustment(pos - 1)
    + get_pair_adjustment_single(pos);

function get_first_letter_offset() =
in_string(text[0], 
    "TY" ) ? -3 : 
in_string(text[0], 
    "vVy" ) ? -1 : 0;
/* ========================================================= */
/* ===================== RENDER ============================ */
/* ========================================================= */

// Ring
// Ring 2/3 (clipped on right side)
if (show_ring) {

    ring_x_pos = -keychainHoleOffset - 2;
    ring_y_pos = get_ring_y_offset(text[0]);

    difference() {

        // Donut
        difference() {
            translate([ring_x_pos, ring_y_pos, 2])
                cylinder(h = ring_height, d = keychainHoleSize + 5);

            translate([ring_x_pos, ring_y_pos, 1])
                cylinder(h = ring_height + 2, d = keychainHoleSize);
        }

        // Cut right side (biar jadi 2/3)
        translate([ring_x_pos +1.8, ring_y_pos - 20, -2])
            cube([20, 40, ring_height + 4]);
    }
}

my_scale = len(text) > 10 ? 0.9 : 1;

// Letters
scale([my_scale, my_scale, 1])
for (i = [0 : len(text) - 1]) {

    pos_x =
    (use_auto_spacing
        ? get_auto_spacing(i - 1)
        : i * font_size * spacing)
    + get_cumulative_adjustment(i)
    + get_pair_adjustment(i)
    + get_first_letter_offset();

    // Main letter
    color(get_color_rgb(general_color))
    translate([pos_x, 0, 0])
    linear_extrude(height = get_height(i))
    text(
        text[i],
        font = font,
        size = font_size,
        kerning = true
    );

    // Connector for lowercase "i"
    if (enable_i_connector && is_lowercase_i(text[i])) {

        translate([
            pos_x + font_size * (text[i] == "i" ? 0.05 : 0.075),
            18,
            0
        ])
        color(get_color_rgb(general_color))
        cube([
            i_connector_width,
            i_connector_depth,
            font_size * 0.25   // intentionally tall to reach dot
        ]);
    }
}
